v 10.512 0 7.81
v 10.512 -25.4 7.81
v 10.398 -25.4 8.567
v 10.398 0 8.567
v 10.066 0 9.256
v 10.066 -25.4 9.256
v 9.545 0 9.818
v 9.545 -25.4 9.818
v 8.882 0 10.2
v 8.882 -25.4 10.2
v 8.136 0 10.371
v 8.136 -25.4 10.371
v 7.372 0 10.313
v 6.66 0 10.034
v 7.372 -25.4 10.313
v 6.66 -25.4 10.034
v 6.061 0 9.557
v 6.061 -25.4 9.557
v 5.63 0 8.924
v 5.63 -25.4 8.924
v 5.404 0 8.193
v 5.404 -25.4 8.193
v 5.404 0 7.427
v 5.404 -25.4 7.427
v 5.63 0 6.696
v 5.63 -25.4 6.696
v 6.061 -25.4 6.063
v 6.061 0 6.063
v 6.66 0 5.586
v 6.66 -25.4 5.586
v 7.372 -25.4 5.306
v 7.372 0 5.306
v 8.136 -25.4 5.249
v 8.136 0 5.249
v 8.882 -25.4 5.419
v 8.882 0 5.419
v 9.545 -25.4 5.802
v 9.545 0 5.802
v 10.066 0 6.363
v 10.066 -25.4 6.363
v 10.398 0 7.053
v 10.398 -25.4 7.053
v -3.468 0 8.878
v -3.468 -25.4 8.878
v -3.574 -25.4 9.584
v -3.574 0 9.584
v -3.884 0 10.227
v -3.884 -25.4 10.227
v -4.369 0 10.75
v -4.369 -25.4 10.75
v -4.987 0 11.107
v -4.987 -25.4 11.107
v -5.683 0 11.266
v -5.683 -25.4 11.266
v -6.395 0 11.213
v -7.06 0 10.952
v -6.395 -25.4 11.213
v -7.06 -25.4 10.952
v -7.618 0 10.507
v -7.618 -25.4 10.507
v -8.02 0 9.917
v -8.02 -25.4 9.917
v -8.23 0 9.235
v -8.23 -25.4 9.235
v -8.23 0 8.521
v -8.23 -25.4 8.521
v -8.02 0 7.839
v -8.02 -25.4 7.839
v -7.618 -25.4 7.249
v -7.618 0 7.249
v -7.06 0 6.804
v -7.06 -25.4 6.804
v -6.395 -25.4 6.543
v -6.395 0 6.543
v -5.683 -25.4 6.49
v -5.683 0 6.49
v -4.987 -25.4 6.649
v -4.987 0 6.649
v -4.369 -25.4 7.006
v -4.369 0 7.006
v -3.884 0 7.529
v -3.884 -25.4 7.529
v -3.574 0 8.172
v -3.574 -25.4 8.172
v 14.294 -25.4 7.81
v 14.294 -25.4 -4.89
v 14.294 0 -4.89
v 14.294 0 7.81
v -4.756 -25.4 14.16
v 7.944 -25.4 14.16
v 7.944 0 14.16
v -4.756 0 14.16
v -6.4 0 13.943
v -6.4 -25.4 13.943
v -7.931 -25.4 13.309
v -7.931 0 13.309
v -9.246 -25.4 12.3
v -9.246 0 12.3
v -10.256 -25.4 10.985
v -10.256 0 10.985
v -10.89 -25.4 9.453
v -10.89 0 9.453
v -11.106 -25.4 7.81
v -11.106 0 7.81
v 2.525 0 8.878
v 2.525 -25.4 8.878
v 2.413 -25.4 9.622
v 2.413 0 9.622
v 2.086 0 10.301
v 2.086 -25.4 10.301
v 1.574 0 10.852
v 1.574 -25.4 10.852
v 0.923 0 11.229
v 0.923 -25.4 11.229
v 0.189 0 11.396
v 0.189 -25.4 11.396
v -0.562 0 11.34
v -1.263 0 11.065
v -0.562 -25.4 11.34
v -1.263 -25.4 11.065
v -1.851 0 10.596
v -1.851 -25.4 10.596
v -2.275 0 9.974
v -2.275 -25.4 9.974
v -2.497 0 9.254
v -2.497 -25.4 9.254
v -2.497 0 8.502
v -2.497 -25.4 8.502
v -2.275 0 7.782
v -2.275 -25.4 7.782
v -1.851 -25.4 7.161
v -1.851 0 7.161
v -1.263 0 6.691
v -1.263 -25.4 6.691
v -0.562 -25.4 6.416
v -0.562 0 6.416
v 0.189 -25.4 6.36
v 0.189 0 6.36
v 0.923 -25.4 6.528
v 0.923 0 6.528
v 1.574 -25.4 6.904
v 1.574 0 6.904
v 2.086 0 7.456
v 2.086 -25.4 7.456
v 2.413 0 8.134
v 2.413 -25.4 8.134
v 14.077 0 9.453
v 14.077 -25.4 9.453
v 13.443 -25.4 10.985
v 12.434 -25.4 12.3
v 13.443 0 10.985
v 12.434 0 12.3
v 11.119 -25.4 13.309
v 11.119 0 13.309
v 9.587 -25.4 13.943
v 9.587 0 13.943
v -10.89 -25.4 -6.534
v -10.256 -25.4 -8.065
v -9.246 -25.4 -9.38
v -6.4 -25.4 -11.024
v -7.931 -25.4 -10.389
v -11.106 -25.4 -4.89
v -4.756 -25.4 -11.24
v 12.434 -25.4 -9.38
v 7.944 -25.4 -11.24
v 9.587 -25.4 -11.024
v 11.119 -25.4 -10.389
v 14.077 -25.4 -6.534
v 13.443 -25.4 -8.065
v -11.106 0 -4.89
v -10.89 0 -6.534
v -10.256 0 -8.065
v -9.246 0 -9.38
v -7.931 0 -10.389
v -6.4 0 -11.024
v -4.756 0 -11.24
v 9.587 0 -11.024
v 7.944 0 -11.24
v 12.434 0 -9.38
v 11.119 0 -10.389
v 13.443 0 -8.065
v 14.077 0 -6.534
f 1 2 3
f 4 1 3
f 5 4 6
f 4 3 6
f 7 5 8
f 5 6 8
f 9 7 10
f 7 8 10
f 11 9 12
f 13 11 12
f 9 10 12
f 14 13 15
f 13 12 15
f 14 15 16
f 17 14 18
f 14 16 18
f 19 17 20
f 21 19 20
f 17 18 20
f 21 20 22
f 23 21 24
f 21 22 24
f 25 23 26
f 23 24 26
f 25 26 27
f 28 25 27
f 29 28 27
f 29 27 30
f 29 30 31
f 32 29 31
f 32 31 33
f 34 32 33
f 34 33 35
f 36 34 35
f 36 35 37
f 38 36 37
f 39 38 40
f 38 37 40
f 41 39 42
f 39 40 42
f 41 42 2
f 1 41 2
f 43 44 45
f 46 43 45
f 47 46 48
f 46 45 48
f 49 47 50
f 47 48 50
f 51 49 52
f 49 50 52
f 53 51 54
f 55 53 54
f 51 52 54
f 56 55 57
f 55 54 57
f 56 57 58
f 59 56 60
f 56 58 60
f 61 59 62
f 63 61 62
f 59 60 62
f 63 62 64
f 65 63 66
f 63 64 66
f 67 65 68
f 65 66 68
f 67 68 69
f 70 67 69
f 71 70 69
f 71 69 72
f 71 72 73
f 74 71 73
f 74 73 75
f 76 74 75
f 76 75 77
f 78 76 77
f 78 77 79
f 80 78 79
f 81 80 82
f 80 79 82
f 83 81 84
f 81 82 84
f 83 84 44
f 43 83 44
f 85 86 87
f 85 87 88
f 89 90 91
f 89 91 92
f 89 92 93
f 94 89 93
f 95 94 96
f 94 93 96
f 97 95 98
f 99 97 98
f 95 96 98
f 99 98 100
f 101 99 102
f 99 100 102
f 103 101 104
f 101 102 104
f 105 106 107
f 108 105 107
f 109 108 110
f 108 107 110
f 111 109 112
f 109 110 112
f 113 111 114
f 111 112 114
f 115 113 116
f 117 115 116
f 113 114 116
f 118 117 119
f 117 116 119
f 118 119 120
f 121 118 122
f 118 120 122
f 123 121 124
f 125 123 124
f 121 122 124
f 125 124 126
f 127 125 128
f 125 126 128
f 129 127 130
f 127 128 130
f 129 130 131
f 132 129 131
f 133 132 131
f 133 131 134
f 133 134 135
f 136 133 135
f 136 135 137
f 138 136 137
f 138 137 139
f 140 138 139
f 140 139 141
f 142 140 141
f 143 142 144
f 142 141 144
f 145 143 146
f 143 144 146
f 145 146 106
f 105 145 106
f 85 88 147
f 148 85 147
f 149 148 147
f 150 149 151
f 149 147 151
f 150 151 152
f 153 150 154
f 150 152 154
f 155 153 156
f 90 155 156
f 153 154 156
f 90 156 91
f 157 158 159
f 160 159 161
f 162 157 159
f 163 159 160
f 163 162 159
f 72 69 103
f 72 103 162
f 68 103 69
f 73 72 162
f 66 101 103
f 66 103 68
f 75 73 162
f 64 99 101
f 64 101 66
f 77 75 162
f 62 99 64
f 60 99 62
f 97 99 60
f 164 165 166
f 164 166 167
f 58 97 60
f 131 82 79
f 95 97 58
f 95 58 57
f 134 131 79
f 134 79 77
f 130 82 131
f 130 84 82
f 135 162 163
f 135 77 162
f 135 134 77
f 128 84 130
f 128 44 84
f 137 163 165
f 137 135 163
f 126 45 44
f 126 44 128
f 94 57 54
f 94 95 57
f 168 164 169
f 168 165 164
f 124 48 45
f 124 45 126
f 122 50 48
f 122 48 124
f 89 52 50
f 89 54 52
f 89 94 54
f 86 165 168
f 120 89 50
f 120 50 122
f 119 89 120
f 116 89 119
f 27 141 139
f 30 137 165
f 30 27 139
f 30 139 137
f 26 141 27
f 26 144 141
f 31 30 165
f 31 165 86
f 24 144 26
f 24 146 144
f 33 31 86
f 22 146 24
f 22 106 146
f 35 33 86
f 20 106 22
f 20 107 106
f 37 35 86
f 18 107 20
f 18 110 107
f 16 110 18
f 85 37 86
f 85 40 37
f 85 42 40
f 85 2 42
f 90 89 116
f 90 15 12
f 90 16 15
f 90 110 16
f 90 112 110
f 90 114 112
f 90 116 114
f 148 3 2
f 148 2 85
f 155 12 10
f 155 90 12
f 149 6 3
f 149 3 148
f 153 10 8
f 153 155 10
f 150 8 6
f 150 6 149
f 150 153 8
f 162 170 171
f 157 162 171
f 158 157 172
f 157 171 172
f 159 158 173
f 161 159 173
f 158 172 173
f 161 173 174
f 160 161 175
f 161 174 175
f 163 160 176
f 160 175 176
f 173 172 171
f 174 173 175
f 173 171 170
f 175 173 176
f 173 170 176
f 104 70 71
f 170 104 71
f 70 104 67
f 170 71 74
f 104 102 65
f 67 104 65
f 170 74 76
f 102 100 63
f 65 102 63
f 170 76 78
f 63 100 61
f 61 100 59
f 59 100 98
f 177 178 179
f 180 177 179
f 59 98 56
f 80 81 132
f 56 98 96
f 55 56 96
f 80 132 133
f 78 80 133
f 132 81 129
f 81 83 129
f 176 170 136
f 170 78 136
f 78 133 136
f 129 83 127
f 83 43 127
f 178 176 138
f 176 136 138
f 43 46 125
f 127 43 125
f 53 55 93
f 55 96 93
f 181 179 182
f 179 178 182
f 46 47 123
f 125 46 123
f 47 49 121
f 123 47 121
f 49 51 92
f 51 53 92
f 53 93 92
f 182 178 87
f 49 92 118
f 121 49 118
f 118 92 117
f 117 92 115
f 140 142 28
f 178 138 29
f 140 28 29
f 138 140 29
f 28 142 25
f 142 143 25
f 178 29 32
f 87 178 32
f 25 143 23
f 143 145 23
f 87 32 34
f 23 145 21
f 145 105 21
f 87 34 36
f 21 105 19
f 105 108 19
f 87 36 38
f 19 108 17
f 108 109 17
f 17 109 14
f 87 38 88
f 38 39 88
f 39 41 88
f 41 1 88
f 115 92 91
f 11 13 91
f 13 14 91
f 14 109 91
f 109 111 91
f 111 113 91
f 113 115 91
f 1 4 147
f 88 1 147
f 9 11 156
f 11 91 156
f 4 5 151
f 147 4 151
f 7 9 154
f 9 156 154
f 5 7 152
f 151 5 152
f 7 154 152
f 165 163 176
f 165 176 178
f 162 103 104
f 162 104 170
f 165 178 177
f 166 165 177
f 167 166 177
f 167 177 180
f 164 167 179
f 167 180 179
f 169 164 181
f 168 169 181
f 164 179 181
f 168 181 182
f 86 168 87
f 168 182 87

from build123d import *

# Parameters (mm, degrees)
F1_DEPTH = 25.4
F2_R     = 2.394714
F2_R_2   = 2.525122
F2_R_3   = 2.568066
F3_DEPTH = 25.4


with BuildPart() as f1:
    # F0 (on Front) → F1 (new body)
    with BuildSketch(Plane.XZ):
        with BuildLine():
            Line((7.943742, 14.15978), (-4.756258, 14.15978))
            ThreePointArc((-4.756258, 14.15978), (-9.246386, 12.299908), (-11.106258, 7.80978))
            Line((-11.106258, 7.80978), (-11.106258, -4.89022))
            ThreePointArc((-11.106258, -4.89022), (-9.246386, -9.380348), (-4.756258, -11.24022))
            Line((-4.756258, -11.24022), (7.943742, -11.24022))
            ThreePointArc((7.943742, -11.24022), (12.43387, -9.380348), (14.293742, -4.89022))
            Line((14.293742, -4.89022), (14.293742, 7.80978))
            ThreePointArc((14.293742, 7.80978), (12.43387, 12.299908), (7.943742, 14.15978))
        make_face()
    extrude(amount=F1_DEPTH)

    # F2 (on face) → F3 (cut)
    with BuildSketch(Plane.XZ.offset(25.4)):
        with Locations((-5.862328, 8.878076)):
            Circle(F2_R)
        with Locations((0, 8.878076)):
            Circle(F2_R_2)
        with Locations((7.943742, 7.80978)):
            Circle(F2_R_3)
    extrude(amount=-F3_DEPTH, mode=Mode.SUBTRACT)


solid = f1.part
